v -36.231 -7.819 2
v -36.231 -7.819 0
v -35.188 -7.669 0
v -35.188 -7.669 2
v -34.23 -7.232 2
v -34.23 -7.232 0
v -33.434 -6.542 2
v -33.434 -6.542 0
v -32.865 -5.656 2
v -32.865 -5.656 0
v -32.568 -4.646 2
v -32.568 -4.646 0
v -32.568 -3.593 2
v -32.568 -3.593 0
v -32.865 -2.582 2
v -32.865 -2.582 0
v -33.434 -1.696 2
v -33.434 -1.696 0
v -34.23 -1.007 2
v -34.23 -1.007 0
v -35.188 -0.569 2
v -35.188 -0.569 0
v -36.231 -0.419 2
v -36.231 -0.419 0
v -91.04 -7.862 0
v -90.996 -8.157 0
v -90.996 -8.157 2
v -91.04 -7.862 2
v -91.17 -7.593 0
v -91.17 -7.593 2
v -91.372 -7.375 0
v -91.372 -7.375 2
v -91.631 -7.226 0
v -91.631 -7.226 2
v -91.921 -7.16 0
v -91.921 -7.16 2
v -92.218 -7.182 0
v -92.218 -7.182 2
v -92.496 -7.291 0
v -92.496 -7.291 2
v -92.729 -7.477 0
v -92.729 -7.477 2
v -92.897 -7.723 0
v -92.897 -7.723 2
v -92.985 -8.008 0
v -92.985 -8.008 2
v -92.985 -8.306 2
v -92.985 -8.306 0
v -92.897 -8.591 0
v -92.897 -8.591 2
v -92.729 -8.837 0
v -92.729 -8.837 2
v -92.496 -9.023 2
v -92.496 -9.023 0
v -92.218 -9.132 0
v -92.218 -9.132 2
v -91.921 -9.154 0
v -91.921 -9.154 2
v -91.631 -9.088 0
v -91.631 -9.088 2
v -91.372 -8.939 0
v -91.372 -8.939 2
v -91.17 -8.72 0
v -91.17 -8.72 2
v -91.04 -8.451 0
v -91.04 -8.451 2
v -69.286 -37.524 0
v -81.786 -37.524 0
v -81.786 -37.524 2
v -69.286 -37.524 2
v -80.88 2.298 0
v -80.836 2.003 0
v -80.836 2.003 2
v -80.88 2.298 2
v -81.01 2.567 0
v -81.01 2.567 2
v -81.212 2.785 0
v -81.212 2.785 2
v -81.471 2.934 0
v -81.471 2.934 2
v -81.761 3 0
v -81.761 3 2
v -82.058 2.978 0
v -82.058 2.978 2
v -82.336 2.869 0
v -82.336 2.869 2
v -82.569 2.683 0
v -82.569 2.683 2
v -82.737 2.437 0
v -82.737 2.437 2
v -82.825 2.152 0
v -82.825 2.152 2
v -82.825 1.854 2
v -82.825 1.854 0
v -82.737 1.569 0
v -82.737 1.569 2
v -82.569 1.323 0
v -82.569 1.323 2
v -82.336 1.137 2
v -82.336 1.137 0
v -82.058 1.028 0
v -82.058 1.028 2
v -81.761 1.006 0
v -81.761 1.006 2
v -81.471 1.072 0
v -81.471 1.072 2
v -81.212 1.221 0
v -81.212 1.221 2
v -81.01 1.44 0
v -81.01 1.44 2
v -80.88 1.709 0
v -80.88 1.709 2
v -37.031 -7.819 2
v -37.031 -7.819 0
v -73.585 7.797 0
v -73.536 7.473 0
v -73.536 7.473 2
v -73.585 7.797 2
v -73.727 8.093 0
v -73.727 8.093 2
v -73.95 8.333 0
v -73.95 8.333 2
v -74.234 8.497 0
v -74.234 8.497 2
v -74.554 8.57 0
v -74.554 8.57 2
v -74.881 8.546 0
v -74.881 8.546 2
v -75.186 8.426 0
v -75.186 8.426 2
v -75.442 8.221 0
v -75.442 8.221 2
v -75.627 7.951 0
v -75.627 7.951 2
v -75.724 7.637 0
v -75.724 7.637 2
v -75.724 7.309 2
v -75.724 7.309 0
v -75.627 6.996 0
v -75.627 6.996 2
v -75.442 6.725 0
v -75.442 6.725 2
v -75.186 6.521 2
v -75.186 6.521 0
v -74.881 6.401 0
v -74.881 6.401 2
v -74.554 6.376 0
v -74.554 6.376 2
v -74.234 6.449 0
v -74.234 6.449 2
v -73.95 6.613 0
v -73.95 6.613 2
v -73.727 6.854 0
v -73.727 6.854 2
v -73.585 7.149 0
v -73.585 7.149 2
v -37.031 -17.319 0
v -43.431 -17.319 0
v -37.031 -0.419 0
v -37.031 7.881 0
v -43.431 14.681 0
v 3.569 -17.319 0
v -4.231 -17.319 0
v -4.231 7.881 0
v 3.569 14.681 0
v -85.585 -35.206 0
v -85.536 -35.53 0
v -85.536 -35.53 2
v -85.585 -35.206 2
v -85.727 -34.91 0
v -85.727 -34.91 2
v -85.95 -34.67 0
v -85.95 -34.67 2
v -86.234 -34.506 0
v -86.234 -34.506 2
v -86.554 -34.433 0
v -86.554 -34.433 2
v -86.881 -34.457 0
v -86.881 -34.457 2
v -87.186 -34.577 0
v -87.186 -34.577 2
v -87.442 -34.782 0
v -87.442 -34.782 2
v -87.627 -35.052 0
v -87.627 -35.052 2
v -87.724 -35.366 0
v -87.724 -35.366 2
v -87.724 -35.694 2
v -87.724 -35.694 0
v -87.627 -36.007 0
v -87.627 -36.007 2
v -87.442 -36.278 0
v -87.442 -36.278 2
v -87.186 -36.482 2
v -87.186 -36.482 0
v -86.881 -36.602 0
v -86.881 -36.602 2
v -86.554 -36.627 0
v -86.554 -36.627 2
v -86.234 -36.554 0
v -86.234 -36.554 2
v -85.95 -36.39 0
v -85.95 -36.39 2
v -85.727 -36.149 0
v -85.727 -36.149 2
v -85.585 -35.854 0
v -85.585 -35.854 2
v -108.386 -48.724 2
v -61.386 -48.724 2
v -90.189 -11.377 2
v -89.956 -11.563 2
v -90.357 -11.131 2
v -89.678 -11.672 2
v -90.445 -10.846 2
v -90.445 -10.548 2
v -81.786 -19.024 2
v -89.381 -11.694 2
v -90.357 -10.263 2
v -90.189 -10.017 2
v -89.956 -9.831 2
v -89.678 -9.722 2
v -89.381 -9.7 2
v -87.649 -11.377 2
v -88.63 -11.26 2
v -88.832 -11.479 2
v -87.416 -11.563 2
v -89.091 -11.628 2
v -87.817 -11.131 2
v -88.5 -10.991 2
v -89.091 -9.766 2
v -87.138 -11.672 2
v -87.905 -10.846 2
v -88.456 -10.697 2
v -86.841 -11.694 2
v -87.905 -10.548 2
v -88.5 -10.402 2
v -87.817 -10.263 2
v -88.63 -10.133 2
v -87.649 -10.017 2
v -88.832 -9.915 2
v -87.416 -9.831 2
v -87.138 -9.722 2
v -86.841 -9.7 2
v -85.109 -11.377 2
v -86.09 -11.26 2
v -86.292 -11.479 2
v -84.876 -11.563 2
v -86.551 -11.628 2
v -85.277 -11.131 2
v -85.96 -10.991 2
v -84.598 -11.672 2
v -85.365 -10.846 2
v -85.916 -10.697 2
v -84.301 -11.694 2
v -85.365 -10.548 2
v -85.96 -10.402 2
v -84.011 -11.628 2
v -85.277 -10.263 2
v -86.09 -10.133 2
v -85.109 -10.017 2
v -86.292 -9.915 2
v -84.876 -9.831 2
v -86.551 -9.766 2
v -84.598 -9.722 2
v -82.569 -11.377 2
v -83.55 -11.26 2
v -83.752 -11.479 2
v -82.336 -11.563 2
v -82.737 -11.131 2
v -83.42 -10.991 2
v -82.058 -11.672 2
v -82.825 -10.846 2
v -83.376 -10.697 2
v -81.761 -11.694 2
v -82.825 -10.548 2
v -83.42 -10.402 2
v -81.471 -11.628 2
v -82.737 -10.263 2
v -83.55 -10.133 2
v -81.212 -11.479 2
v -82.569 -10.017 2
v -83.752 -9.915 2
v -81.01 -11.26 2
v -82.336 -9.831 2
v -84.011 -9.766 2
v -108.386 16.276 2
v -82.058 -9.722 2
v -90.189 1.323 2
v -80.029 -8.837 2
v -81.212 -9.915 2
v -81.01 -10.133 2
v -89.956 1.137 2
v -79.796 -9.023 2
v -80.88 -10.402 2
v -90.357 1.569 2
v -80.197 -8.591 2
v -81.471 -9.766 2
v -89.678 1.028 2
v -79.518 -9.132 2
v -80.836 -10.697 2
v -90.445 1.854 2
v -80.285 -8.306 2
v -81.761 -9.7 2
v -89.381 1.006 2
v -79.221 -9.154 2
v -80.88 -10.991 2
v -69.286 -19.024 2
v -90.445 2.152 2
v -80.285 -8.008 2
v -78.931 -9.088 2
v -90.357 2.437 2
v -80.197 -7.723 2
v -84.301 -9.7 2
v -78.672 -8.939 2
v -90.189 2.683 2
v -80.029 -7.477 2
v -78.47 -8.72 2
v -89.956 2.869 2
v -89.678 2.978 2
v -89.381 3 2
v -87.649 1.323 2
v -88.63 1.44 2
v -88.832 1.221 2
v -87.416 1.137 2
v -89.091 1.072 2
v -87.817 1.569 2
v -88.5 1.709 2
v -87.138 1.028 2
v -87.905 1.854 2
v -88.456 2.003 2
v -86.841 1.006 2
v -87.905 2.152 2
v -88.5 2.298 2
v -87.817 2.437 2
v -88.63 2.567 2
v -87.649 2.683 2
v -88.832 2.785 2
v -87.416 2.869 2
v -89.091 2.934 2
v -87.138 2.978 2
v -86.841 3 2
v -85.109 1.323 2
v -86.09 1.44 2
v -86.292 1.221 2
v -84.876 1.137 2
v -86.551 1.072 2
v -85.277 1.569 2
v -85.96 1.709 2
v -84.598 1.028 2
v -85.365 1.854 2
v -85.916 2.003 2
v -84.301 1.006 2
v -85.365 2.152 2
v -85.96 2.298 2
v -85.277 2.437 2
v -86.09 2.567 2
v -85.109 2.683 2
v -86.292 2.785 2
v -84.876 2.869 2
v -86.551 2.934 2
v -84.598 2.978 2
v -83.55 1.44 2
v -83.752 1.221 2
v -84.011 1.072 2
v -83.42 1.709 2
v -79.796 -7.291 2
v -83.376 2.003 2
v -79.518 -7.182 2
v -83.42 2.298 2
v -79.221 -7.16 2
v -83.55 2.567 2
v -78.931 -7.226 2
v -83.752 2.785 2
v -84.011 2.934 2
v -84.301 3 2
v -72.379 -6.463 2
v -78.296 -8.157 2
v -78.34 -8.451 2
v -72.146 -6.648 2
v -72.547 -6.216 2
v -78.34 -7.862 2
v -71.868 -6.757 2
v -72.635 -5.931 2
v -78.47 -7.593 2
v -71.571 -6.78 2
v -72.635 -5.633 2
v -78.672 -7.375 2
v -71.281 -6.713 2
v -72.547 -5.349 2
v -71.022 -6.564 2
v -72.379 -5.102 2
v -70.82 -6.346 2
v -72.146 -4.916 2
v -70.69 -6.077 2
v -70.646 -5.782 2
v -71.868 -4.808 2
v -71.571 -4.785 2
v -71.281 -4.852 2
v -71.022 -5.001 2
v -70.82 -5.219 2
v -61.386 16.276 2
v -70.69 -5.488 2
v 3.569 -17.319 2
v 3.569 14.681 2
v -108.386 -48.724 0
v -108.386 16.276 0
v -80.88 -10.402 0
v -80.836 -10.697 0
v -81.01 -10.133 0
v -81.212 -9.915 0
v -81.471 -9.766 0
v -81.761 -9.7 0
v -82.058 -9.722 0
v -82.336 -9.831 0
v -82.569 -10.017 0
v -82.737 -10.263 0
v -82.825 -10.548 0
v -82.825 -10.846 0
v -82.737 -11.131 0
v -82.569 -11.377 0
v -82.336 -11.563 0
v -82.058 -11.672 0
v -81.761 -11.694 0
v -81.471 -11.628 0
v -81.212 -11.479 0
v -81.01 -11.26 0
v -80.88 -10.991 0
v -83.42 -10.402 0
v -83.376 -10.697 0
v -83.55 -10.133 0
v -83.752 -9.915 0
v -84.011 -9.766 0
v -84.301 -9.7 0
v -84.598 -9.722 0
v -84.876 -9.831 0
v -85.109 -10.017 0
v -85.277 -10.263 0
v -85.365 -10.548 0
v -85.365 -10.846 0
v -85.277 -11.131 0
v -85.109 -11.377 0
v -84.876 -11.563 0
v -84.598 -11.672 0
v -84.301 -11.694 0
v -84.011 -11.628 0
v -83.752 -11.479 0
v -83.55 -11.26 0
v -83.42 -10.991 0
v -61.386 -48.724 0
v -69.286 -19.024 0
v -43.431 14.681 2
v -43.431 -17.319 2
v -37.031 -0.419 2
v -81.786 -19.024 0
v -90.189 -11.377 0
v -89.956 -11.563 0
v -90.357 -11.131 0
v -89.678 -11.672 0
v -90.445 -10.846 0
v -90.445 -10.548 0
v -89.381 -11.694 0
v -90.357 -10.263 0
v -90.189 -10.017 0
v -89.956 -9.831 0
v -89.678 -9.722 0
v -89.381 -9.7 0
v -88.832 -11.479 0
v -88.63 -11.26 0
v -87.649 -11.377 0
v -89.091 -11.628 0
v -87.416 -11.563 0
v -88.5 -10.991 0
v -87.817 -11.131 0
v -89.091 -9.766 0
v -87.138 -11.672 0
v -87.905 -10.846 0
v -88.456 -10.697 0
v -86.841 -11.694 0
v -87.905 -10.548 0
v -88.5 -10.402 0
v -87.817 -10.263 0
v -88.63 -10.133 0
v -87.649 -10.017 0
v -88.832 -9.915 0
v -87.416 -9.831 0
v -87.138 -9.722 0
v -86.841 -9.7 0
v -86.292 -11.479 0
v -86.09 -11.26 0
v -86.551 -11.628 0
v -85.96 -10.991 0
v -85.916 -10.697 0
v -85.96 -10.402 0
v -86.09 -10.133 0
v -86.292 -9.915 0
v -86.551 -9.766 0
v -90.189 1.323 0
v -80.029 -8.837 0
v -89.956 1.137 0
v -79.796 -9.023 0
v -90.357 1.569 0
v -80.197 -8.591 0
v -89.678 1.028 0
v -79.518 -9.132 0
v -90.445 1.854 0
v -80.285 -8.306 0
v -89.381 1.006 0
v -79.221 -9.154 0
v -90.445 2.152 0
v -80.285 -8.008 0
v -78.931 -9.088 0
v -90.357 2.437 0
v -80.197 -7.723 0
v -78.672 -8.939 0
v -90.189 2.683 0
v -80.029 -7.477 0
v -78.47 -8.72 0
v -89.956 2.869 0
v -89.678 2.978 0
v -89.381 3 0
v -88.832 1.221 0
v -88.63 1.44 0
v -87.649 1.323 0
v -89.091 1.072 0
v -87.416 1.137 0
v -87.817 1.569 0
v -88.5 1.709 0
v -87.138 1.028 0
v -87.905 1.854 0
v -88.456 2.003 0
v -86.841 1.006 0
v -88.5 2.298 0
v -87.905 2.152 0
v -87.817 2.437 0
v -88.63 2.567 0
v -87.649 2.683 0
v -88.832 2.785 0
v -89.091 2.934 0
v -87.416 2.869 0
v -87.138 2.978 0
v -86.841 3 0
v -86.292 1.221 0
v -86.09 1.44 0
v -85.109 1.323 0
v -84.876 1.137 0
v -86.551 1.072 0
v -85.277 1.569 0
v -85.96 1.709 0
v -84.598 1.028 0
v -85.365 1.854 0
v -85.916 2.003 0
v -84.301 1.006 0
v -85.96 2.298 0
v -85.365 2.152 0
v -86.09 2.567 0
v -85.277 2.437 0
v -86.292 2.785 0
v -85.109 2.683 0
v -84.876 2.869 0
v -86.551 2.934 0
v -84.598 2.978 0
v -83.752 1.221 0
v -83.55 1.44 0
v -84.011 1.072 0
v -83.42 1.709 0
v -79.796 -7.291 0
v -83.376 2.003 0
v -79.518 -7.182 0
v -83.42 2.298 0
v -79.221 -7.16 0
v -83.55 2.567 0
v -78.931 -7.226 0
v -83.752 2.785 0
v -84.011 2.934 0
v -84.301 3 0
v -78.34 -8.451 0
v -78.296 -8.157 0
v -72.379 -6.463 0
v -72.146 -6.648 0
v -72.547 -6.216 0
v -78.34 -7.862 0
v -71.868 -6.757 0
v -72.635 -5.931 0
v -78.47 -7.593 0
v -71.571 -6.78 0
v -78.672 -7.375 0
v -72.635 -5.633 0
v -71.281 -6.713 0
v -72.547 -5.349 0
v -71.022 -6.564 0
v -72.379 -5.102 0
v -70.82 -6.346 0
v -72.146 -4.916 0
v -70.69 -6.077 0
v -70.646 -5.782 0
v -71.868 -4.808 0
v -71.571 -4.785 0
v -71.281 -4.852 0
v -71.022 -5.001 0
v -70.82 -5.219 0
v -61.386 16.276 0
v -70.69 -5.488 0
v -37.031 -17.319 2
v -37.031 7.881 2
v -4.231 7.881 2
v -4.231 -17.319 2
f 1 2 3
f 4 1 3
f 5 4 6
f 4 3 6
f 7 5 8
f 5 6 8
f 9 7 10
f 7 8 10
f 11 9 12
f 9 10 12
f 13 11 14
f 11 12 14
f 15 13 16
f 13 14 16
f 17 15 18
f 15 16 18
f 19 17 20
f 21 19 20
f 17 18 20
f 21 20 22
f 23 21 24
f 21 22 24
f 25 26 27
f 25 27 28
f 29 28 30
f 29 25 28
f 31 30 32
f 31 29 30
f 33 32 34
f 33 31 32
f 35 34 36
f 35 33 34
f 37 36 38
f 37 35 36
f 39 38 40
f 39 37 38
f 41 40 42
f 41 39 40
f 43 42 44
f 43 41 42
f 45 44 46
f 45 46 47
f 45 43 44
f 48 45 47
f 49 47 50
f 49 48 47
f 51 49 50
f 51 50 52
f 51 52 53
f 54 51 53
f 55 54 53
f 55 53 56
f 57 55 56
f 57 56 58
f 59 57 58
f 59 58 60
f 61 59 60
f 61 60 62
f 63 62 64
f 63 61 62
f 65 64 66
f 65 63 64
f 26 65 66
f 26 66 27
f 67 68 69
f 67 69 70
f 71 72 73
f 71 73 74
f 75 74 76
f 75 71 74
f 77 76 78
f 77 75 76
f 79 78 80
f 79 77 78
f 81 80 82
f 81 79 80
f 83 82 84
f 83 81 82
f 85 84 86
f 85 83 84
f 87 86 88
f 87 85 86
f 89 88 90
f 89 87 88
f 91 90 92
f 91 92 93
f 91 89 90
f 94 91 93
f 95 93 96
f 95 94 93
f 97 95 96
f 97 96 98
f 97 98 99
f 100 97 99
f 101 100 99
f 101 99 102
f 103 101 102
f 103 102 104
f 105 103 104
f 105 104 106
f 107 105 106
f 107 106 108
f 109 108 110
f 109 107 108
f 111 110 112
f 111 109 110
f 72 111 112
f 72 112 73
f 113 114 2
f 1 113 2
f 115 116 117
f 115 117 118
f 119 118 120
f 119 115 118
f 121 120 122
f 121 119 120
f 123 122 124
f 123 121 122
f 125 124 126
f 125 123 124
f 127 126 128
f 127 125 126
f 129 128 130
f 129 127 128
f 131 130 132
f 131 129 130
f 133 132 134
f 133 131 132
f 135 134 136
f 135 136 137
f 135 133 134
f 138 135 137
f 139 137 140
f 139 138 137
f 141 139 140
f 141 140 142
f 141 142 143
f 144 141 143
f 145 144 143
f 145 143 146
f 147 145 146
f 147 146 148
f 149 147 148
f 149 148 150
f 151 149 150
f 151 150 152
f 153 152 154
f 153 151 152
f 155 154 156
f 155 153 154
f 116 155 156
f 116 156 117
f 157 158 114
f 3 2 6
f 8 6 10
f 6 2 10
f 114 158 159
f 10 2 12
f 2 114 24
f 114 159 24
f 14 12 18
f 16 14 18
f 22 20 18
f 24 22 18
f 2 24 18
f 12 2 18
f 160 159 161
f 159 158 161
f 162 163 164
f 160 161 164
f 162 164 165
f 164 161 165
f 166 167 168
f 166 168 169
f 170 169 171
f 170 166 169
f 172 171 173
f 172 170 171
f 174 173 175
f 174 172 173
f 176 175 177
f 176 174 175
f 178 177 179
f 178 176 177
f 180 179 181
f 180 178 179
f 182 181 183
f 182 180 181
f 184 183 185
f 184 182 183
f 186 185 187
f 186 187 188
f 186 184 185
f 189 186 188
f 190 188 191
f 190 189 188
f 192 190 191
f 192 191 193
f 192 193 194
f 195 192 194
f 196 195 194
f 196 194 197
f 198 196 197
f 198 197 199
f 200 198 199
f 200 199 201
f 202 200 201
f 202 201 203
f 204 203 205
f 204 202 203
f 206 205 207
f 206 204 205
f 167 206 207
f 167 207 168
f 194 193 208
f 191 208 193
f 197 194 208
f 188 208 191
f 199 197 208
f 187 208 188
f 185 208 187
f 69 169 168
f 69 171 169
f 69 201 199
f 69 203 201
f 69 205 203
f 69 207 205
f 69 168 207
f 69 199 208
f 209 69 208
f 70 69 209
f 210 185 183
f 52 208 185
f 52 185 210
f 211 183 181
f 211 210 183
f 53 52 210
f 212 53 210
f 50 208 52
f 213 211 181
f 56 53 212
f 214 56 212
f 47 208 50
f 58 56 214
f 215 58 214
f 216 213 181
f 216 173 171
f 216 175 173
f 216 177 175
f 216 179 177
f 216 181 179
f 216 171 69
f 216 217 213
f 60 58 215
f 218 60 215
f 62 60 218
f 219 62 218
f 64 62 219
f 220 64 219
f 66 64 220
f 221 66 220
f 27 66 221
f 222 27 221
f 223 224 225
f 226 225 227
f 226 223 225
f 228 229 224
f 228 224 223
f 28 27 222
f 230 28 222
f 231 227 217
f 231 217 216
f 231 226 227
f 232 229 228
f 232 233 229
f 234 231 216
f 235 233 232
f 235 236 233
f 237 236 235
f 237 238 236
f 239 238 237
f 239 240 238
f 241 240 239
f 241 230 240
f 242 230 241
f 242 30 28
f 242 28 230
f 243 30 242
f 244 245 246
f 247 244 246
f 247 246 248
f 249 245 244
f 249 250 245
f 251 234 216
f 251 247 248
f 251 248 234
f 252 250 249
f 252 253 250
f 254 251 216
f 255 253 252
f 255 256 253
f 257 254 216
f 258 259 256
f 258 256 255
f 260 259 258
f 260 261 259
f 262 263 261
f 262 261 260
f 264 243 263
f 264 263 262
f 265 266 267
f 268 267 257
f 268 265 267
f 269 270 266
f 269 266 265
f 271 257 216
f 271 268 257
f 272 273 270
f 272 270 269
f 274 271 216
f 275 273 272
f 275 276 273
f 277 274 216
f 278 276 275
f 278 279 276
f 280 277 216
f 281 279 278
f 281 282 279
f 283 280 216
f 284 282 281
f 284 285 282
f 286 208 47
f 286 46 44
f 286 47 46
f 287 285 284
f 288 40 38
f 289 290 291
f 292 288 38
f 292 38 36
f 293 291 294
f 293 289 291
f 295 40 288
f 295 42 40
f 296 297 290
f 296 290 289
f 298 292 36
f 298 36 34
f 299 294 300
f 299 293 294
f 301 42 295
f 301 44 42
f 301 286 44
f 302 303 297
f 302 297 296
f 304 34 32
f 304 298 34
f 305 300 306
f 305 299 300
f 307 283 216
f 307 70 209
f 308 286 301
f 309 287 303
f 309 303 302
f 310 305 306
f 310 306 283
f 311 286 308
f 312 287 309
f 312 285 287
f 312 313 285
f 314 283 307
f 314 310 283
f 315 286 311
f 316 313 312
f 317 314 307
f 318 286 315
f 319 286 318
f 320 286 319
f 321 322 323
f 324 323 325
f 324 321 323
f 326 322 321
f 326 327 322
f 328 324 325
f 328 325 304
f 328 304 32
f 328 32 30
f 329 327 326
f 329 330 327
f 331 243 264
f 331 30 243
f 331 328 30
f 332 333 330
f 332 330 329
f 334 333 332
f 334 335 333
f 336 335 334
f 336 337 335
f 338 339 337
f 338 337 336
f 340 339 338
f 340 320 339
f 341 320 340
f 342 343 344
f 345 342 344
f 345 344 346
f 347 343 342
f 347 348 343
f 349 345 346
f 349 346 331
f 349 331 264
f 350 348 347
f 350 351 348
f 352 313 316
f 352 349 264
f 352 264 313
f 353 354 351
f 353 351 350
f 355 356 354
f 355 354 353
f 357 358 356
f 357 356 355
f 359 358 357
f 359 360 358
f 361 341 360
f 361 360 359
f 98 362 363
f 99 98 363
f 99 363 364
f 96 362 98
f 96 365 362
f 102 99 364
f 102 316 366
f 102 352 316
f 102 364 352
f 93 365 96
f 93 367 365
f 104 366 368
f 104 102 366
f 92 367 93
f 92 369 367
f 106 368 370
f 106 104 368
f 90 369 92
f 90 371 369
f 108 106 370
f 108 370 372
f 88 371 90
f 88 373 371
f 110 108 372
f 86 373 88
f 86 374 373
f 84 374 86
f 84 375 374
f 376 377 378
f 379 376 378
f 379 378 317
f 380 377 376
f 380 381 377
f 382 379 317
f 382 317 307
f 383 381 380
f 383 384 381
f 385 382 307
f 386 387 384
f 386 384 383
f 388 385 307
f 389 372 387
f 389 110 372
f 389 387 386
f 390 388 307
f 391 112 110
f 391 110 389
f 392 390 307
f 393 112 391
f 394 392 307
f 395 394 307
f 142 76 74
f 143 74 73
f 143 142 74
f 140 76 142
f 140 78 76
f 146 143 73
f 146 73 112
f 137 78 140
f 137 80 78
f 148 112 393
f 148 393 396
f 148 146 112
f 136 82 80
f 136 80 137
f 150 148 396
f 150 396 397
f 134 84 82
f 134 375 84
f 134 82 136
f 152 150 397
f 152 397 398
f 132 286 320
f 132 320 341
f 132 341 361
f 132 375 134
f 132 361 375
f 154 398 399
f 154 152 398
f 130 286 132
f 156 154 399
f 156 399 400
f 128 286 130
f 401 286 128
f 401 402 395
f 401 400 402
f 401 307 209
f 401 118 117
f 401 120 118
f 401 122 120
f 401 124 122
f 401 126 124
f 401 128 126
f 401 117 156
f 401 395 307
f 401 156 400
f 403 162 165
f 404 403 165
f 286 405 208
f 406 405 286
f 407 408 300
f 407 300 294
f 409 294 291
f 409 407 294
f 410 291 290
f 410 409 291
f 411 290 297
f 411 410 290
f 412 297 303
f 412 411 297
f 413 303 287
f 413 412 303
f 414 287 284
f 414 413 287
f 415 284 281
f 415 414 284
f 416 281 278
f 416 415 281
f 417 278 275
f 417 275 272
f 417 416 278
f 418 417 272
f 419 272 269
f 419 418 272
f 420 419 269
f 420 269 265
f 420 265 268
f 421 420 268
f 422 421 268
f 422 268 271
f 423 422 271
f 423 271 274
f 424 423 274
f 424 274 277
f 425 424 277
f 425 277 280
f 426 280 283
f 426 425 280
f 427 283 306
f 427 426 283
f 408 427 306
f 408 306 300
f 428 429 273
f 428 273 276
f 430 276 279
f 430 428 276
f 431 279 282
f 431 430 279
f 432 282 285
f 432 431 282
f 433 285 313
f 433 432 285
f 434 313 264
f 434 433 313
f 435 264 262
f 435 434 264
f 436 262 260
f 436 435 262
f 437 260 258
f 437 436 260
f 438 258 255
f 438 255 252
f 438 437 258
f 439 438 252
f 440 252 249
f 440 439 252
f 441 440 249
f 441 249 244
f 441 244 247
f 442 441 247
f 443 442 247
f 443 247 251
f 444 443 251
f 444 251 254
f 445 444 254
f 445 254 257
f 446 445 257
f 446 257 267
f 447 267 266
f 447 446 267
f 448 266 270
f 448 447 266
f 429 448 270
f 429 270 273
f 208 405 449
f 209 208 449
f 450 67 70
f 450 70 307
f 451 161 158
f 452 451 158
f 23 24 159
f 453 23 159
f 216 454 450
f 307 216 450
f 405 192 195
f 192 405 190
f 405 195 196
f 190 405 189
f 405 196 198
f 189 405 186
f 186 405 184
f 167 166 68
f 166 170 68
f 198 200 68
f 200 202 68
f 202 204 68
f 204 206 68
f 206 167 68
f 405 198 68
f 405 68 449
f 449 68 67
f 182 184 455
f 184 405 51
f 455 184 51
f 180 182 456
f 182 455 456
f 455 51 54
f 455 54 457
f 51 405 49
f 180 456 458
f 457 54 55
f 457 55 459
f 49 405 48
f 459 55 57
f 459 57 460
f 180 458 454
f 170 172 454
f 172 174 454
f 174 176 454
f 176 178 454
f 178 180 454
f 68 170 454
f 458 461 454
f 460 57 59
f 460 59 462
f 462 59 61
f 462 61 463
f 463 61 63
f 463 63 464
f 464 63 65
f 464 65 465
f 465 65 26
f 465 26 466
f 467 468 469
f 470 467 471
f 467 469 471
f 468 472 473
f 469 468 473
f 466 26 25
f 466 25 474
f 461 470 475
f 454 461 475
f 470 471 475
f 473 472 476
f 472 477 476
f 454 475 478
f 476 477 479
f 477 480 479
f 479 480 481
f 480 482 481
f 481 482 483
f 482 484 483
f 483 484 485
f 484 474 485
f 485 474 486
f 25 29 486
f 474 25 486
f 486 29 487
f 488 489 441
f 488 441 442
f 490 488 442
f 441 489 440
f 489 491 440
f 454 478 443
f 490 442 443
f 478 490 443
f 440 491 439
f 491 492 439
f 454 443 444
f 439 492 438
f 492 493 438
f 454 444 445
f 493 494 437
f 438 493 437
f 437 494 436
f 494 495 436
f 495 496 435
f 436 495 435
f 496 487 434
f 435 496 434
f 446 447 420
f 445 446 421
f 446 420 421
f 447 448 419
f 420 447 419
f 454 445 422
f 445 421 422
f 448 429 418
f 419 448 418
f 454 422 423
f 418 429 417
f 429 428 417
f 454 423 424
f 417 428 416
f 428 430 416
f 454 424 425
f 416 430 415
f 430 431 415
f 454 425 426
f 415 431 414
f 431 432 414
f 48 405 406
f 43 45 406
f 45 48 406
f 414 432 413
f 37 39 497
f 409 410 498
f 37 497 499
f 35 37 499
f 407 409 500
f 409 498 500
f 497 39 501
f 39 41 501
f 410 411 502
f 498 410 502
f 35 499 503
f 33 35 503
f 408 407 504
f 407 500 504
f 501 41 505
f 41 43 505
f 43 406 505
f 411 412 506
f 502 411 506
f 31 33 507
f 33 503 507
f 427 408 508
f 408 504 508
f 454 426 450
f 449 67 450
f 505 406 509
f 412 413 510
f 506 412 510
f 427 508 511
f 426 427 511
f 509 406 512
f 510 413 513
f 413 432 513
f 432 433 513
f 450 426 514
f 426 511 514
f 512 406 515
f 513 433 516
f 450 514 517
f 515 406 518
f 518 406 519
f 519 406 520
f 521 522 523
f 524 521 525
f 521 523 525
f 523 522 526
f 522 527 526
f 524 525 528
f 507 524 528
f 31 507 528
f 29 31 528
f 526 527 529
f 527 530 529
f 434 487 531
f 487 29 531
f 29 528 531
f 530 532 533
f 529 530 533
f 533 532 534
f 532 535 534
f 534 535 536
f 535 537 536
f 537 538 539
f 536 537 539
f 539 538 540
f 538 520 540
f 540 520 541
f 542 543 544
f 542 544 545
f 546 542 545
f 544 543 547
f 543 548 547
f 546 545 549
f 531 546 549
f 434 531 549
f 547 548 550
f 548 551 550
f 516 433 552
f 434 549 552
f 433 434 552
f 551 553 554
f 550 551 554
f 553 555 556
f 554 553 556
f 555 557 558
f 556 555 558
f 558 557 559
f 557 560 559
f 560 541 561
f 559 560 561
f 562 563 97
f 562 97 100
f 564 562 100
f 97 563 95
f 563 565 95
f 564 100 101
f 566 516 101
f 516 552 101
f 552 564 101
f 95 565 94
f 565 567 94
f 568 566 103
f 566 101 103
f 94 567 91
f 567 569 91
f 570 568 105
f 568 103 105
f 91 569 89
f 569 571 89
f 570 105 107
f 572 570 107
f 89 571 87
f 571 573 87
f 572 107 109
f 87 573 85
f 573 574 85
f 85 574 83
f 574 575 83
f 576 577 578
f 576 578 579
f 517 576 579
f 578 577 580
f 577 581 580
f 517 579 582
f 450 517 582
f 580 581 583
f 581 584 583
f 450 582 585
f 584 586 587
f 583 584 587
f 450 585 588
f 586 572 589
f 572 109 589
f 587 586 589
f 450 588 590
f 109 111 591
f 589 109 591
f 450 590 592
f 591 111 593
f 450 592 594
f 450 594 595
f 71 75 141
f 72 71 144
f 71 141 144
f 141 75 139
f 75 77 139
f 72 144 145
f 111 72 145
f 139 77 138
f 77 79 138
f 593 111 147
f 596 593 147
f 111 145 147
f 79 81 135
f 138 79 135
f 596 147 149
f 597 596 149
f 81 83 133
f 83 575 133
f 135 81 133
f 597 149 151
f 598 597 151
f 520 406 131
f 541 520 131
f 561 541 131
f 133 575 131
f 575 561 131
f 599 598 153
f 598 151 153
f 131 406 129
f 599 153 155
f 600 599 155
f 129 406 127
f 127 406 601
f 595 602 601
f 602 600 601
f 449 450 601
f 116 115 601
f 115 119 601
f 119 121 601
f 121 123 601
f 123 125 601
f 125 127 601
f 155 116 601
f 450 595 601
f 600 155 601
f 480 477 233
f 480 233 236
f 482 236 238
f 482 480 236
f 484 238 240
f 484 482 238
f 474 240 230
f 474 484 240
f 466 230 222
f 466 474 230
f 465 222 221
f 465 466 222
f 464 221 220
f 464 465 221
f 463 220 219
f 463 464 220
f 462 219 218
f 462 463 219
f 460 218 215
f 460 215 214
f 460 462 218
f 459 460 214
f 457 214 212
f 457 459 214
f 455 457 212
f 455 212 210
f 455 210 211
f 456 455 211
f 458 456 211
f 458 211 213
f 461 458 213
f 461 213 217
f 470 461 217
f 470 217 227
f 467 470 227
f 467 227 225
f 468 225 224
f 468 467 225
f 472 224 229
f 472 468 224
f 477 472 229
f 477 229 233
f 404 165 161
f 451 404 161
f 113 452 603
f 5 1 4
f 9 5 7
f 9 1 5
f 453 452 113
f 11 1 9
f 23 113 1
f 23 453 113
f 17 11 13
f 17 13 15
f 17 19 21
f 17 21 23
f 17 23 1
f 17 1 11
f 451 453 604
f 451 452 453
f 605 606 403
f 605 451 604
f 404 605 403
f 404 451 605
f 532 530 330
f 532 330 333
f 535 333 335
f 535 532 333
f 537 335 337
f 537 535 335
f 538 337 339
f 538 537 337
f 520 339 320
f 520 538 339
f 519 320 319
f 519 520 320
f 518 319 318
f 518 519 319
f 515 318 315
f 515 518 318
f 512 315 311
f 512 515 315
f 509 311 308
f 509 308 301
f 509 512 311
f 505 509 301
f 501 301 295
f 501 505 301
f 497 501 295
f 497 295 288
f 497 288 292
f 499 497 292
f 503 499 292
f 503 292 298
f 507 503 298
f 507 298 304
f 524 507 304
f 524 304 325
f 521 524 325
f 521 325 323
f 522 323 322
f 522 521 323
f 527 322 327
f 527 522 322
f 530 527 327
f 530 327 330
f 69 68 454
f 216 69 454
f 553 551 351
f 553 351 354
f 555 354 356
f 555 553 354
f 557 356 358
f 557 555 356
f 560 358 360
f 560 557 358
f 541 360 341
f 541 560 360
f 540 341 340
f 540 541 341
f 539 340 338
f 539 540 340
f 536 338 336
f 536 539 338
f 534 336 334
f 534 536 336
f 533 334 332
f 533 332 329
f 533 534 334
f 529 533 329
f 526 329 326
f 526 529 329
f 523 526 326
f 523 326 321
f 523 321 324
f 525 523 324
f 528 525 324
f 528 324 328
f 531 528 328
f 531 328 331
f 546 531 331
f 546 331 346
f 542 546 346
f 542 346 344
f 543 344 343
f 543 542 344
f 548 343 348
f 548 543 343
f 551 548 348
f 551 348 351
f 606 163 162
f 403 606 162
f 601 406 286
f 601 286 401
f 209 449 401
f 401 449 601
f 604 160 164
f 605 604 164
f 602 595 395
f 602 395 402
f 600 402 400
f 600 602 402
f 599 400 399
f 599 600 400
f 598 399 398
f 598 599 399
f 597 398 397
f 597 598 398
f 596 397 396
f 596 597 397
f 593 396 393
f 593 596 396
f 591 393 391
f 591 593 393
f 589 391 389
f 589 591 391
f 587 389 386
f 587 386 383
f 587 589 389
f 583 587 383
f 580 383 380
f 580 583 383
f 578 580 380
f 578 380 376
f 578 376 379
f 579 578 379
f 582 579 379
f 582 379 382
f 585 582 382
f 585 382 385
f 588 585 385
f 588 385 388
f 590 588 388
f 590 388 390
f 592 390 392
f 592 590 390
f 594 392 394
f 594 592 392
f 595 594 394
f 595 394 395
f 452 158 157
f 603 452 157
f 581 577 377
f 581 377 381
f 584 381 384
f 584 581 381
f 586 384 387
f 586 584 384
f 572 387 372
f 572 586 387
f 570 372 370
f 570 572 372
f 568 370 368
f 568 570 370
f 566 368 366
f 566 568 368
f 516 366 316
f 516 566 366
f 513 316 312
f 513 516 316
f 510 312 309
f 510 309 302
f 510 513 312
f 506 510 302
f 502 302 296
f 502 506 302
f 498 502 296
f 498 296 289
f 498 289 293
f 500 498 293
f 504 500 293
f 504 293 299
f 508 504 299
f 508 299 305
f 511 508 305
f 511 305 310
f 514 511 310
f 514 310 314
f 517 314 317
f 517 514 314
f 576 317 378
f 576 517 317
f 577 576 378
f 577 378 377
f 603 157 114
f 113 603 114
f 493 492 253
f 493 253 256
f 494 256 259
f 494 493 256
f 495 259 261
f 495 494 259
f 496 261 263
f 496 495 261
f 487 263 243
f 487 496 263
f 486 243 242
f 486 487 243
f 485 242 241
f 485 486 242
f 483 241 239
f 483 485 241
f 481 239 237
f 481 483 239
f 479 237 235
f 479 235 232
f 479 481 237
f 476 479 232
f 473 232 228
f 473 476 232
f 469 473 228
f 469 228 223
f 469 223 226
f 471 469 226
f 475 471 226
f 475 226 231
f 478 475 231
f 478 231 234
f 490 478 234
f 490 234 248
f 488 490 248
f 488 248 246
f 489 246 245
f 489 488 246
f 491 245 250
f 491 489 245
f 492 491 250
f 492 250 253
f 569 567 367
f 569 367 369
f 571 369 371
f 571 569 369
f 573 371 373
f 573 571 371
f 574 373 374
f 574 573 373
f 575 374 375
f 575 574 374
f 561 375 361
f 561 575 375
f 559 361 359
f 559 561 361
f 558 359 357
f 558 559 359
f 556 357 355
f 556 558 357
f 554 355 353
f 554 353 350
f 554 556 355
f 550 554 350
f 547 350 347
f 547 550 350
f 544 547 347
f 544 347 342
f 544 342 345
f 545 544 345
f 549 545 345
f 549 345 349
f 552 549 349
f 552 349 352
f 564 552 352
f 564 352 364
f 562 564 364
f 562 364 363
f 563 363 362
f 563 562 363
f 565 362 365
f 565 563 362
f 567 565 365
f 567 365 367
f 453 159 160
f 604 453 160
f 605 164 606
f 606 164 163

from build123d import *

# Parameters (mm, degrees)
F0_W     = 47
F0_H     = 65
F0_R     = 1.1
F0_W_2   = 12.5
F0_H_2   = 18.5
F0_R_2   = 1
F1_DEPTH = 2
F2_DEPTH = 2


with BuildPart() as f1:
    # F0 (on Top) → F1 (new body)
    with BuildSketch(Plane.XY):
        with Locations((-84.88592, -16.223743)):
            Rectangle(F0_W, F0_H)
        with Locations((-86.63592, -35.529743)):
            Circle(F0_R, mode=Mode.SUBTRACT)
        with Locations((-75.53592, -28.273743)):
            Rectangle(F0_W_2, F0_H_2, mode=Mode.SUBTRACT)
        with Locations((-89.45592, -10.696743)):
            Circle(F0_R_2, mode=Mode.SUBTRACT)
        with Locations((-91.99592, -8.156743)):
            Circle(F0_R_2, mode=Mode.SUBTRACT)
        with Locations((-86.91592, -10.696743)):
            Circle(F0_R_2, mode=Mode.SUBTRACT)
        with Locations((-84.37592, -10.696743)):
            Circle(F0_R_2, mode=Mode.SUBTRACT)
        with Locations((-81.83592, -10.696743)):
            Circle(F0_R_2, mode=Mode.SUBTRACT)
        with Locations((-79.29592, -8.156743)):
            Circle(F0_R_2, mode=Mode.SUBTRACT)
        with Locations((-71.64592, -5.782441)):
            Circle(F0_R_2, mode=Mode.SUBTRACT)
        with Locations((-89.45592, 2.003257)):
            Circle(F0_R_2, mode=Mode.SUBTRACT)
        with Locations((-86.91592, 2.003257)):
            Circle(F0_R_2, mode=Mode.SUBTRACT)
        with Locations((-84.37592, 2.003257)):
            Circle(F0_R_2, mode=Mode.SUBTRACT)
        with Locations((-81.83592, 2.003257)):
            Circle(F0_R_2, mode=Mode.SUBTRACT)
        with Locations((-74.63592, 7.473257)):
            Circle(F0_R, mode=Mode.SUBTRACT)
    extrude(amount=F1_DEPTH)


with BuildPart() as f2:
    # F0 (on Top) → F2 (new body)
    with BuildSketch(Plane.XY):
        with BuildLine():
            Line((-43.430672, 14.680812), (-43.430672, -17.319188))
            Line((-43.430672, -17.319188), (-37.030672, -17.319188))
            Line((-37.030672, -17.319188), (-37.030672, -7.819188))
            Line((-37.030672, -7.819188), (-36.230672, -7.819188))
            ThreePointArc((-36.230672, -7.819188), (-32.530672, -4.119188), (-36.230672, -0.419188))
            Line((-36.230672, -0.419188), (-37.030672, -0.419188))
            Line((-37.030672, -0.419188), (-37.030672, 7.880812))
            Line((-37.030672, 7.880812), (-4.230672, 7.880812))
            Line((-4.230672, 7.880812), (-4.230672, -17.319188))
            Line((-4.230672, -17.319188), (3.569328, -17.319188))
            Line((3.569328, -17.319188), (3.569328, 14.680812))
            Line((3.569328, 14.680812), (-43.430672, 14.680812))
        make_face()
    extrude(amount=F2_DEPTH)


solid = Compound([f1.part, f2.part])
